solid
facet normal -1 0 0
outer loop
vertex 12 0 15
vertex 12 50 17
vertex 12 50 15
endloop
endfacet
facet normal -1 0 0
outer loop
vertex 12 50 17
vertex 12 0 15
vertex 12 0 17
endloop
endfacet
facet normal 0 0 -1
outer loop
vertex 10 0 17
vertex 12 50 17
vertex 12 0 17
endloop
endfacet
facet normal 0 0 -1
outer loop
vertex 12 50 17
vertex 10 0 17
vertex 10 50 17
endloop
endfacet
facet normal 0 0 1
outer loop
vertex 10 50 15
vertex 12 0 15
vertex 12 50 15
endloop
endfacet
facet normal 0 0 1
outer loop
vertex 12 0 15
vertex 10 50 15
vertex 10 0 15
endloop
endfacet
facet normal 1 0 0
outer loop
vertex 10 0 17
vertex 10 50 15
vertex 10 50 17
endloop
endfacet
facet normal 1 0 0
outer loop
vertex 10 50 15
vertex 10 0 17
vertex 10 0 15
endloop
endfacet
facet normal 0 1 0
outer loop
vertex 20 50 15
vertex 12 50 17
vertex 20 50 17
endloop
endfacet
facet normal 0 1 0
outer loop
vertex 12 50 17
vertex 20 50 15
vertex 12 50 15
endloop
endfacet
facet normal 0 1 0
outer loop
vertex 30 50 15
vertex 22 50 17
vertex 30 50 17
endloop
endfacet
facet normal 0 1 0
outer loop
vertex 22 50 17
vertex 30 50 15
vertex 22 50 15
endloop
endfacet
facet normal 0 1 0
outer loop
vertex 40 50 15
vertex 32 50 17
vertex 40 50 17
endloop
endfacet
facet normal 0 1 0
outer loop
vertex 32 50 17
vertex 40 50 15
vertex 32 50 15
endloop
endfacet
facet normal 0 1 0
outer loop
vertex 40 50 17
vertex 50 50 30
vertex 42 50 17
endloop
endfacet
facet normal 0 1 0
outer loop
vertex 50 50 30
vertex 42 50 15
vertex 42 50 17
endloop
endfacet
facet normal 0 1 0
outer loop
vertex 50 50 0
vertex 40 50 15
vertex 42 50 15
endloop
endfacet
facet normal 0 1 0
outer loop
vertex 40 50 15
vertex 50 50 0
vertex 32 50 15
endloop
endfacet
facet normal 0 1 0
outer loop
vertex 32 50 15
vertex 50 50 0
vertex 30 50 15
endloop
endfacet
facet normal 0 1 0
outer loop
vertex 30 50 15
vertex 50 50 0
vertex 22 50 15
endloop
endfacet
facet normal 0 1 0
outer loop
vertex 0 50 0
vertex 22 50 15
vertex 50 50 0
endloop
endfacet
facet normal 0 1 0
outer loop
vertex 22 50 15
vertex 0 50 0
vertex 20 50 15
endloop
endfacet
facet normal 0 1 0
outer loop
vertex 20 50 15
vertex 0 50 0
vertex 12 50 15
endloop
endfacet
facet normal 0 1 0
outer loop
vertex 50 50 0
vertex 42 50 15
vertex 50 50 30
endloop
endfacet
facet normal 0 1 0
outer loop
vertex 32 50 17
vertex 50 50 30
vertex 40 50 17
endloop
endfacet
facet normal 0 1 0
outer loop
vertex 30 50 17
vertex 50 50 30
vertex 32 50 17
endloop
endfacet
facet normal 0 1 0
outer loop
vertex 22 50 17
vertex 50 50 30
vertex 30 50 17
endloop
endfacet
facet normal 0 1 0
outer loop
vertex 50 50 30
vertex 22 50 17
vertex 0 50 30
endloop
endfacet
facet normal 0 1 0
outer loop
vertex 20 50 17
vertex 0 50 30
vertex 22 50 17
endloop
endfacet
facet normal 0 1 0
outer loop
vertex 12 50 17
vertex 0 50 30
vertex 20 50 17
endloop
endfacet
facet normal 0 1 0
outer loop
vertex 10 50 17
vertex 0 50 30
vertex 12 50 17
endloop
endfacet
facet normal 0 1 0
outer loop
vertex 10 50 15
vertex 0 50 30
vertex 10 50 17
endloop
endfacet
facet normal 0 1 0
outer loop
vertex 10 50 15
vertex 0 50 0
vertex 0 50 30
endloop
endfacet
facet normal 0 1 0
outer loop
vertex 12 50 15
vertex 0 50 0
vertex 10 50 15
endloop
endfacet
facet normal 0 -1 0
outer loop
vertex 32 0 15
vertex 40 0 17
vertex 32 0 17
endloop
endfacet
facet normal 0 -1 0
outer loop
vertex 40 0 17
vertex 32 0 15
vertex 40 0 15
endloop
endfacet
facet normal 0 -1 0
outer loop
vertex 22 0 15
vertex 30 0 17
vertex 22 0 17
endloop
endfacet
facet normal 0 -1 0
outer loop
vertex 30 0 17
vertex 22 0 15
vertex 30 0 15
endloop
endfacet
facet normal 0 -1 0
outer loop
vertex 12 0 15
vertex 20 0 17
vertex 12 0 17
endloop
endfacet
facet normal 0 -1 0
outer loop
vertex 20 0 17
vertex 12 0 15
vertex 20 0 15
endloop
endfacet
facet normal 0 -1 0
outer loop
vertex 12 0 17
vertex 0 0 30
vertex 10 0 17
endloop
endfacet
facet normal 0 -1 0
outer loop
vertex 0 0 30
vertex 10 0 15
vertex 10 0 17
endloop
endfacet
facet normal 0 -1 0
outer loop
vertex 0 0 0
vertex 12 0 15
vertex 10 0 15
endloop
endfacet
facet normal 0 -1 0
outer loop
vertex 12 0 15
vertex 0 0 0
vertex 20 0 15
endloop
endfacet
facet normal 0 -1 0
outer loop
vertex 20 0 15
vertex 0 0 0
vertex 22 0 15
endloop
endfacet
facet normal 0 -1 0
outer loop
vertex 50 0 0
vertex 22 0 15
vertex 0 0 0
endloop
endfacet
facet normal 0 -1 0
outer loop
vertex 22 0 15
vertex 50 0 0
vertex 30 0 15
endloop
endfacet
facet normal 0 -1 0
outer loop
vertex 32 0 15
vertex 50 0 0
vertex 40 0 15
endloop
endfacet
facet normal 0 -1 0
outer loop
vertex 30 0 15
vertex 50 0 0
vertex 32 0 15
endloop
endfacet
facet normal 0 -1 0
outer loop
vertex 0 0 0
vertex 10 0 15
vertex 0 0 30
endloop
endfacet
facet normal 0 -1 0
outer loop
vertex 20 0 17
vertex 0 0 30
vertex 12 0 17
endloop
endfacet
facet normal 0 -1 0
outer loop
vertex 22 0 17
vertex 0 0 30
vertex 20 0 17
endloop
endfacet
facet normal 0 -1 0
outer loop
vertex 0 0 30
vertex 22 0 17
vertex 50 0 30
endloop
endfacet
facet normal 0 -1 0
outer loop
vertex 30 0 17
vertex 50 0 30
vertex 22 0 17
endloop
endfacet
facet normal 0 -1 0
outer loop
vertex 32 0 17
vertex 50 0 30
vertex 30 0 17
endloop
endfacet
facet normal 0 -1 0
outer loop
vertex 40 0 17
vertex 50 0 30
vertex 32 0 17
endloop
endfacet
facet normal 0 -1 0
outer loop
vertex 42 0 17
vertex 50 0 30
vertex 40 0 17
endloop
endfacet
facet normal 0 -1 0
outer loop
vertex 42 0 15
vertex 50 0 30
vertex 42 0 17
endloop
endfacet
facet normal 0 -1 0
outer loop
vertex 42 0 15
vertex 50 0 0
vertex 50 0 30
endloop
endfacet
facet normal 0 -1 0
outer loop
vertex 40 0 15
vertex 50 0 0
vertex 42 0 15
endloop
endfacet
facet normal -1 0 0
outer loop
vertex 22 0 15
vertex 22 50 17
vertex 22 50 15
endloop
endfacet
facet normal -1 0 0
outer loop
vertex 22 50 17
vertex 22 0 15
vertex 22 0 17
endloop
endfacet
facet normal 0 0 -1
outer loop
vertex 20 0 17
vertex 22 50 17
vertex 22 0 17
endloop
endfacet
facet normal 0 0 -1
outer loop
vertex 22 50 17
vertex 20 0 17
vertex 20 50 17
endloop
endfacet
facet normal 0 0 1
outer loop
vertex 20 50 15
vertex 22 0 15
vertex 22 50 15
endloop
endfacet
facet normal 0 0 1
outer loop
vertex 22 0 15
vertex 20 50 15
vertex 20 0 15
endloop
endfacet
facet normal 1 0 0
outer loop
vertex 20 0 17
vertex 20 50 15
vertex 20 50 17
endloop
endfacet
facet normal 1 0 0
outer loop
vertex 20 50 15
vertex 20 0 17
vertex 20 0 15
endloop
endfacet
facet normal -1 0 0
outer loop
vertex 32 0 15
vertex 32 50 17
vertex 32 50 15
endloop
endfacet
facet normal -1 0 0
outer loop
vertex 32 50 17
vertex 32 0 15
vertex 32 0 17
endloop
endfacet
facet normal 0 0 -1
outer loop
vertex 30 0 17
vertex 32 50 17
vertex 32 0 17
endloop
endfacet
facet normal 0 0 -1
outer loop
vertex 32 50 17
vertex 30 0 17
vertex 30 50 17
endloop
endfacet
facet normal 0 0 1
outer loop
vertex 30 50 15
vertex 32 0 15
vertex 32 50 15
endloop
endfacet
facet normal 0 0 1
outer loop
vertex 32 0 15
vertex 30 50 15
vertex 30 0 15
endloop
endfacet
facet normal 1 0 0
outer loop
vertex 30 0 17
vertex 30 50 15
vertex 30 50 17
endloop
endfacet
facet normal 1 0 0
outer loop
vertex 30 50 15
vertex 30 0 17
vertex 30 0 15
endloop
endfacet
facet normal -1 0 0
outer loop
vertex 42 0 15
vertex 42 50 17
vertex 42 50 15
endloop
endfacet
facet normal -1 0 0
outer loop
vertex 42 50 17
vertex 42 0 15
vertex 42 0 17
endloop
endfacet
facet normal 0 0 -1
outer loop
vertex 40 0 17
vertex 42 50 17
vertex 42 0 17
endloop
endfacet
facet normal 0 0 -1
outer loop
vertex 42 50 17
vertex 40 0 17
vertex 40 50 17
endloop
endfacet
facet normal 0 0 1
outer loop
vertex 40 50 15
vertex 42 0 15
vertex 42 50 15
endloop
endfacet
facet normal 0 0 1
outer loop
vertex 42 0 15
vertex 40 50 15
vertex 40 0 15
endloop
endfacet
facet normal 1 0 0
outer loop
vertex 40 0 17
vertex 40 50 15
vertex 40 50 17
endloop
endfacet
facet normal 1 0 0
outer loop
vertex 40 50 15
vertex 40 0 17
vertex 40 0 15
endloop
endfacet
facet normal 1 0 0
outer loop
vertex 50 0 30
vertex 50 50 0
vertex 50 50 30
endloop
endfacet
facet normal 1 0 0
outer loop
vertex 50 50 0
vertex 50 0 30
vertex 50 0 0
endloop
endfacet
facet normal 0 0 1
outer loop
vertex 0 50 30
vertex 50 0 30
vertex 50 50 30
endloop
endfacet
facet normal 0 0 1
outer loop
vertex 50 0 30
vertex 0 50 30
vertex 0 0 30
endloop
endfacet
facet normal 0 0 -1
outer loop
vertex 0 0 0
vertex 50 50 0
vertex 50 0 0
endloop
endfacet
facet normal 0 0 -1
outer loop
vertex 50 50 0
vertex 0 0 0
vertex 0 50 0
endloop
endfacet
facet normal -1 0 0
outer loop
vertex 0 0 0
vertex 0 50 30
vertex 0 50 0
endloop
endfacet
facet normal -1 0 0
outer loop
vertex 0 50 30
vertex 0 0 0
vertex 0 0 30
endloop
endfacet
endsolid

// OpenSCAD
module ranuras() {
    for (x = [10:10:40]) { // Cada 10 mm
        translate([x, 0, 15])
            cube([2, 50, 2]);  // Ranura
    }
}

difference() {
    cube([50, 50, 30]);  // Caja
    ranuras();
}
